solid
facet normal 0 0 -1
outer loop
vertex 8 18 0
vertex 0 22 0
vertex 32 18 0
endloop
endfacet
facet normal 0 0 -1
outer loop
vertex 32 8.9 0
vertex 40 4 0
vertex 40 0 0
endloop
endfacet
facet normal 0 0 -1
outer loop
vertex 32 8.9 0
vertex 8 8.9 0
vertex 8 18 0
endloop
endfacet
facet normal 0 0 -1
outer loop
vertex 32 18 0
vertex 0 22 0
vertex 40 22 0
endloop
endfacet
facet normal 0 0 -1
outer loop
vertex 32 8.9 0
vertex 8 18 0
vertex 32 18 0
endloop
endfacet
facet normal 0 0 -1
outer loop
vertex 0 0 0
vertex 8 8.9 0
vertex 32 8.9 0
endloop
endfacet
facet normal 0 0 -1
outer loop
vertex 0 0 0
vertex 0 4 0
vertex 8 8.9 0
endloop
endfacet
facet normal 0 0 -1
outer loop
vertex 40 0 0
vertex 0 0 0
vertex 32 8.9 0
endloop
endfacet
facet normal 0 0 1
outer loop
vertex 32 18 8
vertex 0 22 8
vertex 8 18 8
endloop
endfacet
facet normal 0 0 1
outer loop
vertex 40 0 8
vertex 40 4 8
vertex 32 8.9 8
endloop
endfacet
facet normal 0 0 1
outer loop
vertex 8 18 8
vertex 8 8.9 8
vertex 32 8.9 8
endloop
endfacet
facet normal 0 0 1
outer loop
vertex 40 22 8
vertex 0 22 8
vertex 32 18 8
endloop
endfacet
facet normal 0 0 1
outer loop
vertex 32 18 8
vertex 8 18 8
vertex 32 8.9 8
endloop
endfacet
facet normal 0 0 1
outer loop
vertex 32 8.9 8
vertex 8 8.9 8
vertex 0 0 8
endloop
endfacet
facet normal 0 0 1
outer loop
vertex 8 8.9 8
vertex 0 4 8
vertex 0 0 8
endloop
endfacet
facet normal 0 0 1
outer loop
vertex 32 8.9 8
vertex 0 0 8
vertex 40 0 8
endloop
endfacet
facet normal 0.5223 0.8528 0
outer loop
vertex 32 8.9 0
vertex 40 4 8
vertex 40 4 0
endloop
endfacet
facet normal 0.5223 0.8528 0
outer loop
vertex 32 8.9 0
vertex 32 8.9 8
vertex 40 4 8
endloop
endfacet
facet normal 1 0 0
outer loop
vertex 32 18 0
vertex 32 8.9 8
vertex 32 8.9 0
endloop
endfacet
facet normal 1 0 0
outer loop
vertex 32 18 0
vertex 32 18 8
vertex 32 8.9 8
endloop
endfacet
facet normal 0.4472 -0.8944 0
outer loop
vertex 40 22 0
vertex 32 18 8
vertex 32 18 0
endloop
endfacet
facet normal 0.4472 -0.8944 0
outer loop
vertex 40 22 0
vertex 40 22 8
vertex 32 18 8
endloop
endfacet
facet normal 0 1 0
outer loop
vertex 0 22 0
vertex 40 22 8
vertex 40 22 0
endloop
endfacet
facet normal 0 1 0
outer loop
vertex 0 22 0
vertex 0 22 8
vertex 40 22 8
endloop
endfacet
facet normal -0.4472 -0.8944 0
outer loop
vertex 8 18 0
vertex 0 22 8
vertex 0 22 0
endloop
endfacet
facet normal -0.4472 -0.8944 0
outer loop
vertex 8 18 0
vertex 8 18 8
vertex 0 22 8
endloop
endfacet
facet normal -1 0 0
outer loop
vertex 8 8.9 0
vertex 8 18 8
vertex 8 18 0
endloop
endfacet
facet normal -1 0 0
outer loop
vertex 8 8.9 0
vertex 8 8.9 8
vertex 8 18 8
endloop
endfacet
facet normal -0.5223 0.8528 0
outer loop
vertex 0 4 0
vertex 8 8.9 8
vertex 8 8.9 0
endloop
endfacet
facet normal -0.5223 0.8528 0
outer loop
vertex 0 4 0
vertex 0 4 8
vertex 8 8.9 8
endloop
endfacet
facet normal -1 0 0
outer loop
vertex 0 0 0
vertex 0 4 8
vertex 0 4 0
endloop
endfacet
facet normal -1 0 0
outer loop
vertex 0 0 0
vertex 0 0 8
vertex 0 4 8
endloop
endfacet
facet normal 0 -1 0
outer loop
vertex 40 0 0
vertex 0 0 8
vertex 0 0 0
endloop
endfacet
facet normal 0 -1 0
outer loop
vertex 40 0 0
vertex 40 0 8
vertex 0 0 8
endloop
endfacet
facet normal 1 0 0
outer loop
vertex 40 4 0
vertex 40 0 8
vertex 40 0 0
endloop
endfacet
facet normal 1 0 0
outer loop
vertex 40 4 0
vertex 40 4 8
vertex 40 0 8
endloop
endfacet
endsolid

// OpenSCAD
$fn = 32;

// ----------------------------------------------------------------------
// Key bar: dovetail key, 8 mm thick
// ----------------------------------------------------------------------

// --- parameters (mm) ---
profile_height = 8;       // extrusion height
profile_points = 10;      // points of the closed outline

profile = [[0, 0], [40, 0], [40, 4], [32, 8.9], [32, 18], [40, 22], [0, 22], [8, 18], [8, 8.9], [0, 4]];  // single closed polygon, 10 points, counter clockwise

// --- the one profile operation ---
linear_extrude(height = profile_height) polygon(points = profile);
